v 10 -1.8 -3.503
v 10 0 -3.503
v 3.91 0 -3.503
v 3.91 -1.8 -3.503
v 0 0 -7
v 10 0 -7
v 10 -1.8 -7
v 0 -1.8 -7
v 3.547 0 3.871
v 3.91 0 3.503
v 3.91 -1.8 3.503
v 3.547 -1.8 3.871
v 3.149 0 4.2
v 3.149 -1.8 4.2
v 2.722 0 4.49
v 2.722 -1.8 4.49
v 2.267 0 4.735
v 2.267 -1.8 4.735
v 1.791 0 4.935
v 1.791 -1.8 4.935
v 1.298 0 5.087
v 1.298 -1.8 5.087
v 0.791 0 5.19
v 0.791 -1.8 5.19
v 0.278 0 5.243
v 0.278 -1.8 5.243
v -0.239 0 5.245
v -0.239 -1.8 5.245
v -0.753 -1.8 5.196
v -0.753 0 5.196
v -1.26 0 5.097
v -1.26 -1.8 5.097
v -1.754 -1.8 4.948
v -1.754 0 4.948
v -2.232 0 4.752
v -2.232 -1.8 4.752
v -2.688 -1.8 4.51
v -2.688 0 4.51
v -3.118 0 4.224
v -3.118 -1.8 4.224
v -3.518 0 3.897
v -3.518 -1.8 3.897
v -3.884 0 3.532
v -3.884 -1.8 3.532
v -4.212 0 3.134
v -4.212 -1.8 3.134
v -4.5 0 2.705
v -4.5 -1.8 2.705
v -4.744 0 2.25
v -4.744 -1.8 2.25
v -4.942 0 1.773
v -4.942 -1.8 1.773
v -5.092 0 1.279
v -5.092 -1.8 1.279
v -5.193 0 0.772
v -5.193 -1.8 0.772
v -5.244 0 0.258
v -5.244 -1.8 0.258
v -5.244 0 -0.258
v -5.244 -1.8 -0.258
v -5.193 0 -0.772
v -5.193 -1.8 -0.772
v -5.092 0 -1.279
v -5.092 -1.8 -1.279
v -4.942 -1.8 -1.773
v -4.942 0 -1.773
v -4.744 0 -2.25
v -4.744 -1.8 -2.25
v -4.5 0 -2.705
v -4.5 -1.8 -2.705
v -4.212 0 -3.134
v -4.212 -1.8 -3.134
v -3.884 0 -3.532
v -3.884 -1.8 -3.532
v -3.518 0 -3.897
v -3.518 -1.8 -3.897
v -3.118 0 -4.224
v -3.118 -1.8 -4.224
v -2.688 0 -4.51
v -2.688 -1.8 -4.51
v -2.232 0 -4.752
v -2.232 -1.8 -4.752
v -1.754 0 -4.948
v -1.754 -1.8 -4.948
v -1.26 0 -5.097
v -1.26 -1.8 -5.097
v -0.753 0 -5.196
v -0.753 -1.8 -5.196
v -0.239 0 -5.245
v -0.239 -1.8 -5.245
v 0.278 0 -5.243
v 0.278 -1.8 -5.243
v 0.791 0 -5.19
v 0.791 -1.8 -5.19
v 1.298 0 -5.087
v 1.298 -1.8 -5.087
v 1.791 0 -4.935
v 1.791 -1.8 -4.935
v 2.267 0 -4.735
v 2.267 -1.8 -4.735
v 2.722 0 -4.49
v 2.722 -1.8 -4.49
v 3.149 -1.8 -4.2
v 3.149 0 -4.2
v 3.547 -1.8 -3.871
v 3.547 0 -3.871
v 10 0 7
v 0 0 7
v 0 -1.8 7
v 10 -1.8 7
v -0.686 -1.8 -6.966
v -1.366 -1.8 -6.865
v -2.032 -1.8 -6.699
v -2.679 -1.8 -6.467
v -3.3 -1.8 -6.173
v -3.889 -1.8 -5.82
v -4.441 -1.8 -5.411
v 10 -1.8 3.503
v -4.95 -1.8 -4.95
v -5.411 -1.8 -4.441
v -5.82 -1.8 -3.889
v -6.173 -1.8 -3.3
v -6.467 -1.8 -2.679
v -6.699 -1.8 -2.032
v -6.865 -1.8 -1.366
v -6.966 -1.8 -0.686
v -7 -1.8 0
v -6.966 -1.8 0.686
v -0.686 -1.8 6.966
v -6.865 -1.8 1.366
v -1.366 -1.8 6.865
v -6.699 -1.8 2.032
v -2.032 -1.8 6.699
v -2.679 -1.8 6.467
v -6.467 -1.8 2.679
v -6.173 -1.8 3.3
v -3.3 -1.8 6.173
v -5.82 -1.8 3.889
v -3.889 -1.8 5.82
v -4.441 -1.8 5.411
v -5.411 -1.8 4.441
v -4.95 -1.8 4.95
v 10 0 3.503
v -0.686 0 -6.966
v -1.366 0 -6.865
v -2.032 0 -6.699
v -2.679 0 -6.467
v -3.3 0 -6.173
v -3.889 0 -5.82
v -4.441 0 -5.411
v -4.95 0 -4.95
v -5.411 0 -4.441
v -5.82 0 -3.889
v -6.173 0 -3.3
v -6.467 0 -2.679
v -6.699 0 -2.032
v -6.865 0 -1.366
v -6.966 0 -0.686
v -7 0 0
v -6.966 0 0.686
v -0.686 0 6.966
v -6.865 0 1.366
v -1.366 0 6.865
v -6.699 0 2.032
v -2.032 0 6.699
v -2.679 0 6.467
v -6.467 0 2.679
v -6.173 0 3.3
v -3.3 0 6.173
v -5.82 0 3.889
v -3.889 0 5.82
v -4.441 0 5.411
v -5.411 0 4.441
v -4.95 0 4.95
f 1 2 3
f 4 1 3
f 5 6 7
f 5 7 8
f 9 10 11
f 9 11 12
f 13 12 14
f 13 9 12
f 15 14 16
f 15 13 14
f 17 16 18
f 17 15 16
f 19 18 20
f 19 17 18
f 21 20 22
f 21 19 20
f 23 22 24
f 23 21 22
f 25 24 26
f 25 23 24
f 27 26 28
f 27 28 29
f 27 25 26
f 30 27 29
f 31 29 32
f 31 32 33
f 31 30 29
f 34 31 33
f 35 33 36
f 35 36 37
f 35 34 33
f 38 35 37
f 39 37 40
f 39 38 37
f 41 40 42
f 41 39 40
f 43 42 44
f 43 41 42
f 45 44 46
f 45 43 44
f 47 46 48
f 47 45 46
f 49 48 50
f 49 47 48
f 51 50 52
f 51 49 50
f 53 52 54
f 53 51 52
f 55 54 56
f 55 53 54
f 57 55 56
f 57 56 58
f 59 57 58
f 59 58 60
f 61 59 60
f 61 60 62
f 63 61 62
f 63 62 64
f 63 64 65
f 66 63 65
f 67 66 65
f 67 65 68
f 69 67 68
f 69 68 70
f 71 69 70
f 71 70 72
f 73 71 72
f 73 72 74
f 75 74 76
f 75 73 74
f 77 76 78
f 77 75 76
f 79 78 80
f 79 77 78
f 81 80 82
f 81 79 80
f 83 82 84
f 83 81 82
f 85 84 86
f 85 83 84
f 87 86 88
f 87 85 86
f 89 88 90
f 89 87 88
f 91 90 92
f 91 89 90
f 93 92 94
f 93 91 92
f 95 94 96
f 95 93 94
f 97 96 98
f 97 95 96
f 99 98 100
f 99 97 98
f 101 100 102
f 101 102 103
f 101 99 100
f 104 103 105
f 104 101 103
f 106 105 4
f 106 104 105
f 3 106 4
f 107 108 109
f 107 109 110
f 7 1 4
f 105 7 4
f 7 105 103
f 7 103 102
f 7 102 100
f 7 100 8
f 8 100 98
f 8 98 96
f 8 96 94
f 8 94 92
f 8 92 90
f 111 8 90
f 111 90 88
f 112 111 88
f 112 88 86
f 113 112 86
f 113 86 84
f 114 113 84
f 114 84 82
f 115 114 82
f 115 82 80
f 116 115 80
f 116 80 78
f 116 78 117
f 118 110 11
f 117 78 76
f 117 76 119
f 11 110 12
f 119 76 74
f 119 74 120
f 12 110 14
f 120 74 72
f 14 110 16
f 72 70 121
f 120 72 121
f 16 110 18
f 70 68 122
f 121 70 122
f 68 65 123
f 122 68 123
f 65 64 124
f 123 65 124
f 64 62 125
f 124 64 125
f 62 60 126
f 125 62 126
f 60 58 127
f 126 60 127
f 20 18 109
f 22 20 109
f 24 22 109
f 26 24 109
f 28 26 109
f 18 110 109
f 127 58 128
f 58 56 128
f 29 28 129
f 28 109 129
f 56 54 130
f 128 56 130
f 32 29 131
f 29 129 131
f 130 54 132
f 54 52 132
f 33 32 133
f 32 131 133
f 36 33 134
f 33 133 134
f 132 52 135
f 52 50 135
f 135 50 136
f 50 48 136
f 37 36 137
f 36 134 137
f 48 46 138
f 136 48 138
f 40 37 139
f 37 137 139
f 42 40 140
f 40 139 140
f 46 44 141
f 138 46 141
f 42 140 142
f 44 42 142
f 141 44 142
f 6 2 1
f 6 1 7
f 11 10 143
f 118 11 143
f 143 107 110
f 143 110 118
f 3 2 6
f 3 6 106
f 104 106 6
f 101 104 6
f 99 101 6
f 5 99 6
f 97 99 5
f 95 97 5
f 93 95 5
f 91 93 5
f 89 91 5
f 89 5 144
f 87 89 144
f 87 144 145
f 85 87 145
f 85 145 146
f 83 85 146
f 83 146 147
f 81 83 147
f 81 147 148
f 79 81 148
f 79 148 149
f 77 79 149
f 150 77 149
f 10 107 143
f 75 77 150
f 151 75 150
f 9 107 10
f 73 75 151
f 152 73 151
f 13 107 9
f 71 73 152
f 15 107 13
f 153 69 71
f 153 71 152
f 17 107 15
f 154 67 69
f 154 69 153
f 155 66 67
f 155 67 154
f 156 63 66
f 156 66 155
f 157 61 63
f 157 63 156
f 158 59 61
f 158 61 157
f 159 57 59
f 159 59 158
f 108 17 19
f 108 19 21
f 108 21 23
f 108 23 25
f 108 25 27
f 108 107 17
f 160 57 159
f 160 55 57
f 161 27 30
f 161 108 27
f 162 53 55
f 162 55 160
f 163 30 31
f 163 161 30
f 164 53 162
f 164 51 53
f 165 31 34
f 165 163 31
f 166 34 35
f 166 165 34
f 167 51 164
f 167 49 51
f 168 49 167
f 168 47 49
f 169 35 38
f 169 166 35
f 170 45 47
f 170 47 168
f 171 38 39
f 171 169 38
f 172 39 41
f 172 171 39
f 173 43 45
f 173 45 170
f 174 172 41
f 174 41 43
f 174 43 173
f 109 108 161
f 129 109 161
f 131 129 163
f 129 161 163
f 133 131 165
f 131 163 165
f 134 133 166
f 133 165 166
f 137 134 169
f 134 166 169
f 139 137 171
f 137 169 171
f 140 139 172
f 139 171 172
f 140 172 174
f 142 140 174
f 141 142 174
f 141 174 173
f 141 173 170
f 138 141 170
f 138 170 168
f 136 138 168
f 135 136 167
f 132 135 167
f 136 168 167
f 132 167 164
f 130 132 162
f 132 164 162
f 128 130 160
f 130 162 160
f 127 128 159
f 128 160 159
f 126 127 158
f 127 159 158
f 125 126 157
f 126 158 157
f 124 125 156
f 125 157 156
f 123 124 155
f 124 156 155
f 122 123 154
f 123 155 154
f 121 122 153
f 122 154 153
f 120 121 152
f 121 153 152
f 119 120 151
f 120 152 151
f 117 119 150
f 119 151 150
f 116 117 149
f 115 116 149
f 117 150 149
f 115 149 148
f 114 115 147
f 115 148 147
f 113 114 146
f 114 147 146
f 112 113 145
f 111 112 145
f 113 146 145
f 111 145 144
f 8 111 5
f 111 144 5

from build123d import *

# Parameters (mm, degrees)
PAD_DEPTH = 1.8


with BuildPart() as part:
    # Sketch → Pad (new body)
    with BuildSketch(Plane.XZ):
        with BuildLine():
            ThreePointArc((3.91, 3.503484), (-5.25, 0), (3.91, -3.503484))
            Line((10, -3.503484), (3.91, -3.503484))
            Line((10, -3.503484), (10, -7))
            Line((10, -7), (0, -7))
            ThreePointArc((0, 7), (-7, 0), (0, -7))
            Line((0, 7), (10, 7))
            Line((10, 7), (10, 3.503484))
            Line((3.91, 3.503484), (10, 3.503484))
        make_face()
    extrude(amount=PAD_DEPTH)


solid = part.part
